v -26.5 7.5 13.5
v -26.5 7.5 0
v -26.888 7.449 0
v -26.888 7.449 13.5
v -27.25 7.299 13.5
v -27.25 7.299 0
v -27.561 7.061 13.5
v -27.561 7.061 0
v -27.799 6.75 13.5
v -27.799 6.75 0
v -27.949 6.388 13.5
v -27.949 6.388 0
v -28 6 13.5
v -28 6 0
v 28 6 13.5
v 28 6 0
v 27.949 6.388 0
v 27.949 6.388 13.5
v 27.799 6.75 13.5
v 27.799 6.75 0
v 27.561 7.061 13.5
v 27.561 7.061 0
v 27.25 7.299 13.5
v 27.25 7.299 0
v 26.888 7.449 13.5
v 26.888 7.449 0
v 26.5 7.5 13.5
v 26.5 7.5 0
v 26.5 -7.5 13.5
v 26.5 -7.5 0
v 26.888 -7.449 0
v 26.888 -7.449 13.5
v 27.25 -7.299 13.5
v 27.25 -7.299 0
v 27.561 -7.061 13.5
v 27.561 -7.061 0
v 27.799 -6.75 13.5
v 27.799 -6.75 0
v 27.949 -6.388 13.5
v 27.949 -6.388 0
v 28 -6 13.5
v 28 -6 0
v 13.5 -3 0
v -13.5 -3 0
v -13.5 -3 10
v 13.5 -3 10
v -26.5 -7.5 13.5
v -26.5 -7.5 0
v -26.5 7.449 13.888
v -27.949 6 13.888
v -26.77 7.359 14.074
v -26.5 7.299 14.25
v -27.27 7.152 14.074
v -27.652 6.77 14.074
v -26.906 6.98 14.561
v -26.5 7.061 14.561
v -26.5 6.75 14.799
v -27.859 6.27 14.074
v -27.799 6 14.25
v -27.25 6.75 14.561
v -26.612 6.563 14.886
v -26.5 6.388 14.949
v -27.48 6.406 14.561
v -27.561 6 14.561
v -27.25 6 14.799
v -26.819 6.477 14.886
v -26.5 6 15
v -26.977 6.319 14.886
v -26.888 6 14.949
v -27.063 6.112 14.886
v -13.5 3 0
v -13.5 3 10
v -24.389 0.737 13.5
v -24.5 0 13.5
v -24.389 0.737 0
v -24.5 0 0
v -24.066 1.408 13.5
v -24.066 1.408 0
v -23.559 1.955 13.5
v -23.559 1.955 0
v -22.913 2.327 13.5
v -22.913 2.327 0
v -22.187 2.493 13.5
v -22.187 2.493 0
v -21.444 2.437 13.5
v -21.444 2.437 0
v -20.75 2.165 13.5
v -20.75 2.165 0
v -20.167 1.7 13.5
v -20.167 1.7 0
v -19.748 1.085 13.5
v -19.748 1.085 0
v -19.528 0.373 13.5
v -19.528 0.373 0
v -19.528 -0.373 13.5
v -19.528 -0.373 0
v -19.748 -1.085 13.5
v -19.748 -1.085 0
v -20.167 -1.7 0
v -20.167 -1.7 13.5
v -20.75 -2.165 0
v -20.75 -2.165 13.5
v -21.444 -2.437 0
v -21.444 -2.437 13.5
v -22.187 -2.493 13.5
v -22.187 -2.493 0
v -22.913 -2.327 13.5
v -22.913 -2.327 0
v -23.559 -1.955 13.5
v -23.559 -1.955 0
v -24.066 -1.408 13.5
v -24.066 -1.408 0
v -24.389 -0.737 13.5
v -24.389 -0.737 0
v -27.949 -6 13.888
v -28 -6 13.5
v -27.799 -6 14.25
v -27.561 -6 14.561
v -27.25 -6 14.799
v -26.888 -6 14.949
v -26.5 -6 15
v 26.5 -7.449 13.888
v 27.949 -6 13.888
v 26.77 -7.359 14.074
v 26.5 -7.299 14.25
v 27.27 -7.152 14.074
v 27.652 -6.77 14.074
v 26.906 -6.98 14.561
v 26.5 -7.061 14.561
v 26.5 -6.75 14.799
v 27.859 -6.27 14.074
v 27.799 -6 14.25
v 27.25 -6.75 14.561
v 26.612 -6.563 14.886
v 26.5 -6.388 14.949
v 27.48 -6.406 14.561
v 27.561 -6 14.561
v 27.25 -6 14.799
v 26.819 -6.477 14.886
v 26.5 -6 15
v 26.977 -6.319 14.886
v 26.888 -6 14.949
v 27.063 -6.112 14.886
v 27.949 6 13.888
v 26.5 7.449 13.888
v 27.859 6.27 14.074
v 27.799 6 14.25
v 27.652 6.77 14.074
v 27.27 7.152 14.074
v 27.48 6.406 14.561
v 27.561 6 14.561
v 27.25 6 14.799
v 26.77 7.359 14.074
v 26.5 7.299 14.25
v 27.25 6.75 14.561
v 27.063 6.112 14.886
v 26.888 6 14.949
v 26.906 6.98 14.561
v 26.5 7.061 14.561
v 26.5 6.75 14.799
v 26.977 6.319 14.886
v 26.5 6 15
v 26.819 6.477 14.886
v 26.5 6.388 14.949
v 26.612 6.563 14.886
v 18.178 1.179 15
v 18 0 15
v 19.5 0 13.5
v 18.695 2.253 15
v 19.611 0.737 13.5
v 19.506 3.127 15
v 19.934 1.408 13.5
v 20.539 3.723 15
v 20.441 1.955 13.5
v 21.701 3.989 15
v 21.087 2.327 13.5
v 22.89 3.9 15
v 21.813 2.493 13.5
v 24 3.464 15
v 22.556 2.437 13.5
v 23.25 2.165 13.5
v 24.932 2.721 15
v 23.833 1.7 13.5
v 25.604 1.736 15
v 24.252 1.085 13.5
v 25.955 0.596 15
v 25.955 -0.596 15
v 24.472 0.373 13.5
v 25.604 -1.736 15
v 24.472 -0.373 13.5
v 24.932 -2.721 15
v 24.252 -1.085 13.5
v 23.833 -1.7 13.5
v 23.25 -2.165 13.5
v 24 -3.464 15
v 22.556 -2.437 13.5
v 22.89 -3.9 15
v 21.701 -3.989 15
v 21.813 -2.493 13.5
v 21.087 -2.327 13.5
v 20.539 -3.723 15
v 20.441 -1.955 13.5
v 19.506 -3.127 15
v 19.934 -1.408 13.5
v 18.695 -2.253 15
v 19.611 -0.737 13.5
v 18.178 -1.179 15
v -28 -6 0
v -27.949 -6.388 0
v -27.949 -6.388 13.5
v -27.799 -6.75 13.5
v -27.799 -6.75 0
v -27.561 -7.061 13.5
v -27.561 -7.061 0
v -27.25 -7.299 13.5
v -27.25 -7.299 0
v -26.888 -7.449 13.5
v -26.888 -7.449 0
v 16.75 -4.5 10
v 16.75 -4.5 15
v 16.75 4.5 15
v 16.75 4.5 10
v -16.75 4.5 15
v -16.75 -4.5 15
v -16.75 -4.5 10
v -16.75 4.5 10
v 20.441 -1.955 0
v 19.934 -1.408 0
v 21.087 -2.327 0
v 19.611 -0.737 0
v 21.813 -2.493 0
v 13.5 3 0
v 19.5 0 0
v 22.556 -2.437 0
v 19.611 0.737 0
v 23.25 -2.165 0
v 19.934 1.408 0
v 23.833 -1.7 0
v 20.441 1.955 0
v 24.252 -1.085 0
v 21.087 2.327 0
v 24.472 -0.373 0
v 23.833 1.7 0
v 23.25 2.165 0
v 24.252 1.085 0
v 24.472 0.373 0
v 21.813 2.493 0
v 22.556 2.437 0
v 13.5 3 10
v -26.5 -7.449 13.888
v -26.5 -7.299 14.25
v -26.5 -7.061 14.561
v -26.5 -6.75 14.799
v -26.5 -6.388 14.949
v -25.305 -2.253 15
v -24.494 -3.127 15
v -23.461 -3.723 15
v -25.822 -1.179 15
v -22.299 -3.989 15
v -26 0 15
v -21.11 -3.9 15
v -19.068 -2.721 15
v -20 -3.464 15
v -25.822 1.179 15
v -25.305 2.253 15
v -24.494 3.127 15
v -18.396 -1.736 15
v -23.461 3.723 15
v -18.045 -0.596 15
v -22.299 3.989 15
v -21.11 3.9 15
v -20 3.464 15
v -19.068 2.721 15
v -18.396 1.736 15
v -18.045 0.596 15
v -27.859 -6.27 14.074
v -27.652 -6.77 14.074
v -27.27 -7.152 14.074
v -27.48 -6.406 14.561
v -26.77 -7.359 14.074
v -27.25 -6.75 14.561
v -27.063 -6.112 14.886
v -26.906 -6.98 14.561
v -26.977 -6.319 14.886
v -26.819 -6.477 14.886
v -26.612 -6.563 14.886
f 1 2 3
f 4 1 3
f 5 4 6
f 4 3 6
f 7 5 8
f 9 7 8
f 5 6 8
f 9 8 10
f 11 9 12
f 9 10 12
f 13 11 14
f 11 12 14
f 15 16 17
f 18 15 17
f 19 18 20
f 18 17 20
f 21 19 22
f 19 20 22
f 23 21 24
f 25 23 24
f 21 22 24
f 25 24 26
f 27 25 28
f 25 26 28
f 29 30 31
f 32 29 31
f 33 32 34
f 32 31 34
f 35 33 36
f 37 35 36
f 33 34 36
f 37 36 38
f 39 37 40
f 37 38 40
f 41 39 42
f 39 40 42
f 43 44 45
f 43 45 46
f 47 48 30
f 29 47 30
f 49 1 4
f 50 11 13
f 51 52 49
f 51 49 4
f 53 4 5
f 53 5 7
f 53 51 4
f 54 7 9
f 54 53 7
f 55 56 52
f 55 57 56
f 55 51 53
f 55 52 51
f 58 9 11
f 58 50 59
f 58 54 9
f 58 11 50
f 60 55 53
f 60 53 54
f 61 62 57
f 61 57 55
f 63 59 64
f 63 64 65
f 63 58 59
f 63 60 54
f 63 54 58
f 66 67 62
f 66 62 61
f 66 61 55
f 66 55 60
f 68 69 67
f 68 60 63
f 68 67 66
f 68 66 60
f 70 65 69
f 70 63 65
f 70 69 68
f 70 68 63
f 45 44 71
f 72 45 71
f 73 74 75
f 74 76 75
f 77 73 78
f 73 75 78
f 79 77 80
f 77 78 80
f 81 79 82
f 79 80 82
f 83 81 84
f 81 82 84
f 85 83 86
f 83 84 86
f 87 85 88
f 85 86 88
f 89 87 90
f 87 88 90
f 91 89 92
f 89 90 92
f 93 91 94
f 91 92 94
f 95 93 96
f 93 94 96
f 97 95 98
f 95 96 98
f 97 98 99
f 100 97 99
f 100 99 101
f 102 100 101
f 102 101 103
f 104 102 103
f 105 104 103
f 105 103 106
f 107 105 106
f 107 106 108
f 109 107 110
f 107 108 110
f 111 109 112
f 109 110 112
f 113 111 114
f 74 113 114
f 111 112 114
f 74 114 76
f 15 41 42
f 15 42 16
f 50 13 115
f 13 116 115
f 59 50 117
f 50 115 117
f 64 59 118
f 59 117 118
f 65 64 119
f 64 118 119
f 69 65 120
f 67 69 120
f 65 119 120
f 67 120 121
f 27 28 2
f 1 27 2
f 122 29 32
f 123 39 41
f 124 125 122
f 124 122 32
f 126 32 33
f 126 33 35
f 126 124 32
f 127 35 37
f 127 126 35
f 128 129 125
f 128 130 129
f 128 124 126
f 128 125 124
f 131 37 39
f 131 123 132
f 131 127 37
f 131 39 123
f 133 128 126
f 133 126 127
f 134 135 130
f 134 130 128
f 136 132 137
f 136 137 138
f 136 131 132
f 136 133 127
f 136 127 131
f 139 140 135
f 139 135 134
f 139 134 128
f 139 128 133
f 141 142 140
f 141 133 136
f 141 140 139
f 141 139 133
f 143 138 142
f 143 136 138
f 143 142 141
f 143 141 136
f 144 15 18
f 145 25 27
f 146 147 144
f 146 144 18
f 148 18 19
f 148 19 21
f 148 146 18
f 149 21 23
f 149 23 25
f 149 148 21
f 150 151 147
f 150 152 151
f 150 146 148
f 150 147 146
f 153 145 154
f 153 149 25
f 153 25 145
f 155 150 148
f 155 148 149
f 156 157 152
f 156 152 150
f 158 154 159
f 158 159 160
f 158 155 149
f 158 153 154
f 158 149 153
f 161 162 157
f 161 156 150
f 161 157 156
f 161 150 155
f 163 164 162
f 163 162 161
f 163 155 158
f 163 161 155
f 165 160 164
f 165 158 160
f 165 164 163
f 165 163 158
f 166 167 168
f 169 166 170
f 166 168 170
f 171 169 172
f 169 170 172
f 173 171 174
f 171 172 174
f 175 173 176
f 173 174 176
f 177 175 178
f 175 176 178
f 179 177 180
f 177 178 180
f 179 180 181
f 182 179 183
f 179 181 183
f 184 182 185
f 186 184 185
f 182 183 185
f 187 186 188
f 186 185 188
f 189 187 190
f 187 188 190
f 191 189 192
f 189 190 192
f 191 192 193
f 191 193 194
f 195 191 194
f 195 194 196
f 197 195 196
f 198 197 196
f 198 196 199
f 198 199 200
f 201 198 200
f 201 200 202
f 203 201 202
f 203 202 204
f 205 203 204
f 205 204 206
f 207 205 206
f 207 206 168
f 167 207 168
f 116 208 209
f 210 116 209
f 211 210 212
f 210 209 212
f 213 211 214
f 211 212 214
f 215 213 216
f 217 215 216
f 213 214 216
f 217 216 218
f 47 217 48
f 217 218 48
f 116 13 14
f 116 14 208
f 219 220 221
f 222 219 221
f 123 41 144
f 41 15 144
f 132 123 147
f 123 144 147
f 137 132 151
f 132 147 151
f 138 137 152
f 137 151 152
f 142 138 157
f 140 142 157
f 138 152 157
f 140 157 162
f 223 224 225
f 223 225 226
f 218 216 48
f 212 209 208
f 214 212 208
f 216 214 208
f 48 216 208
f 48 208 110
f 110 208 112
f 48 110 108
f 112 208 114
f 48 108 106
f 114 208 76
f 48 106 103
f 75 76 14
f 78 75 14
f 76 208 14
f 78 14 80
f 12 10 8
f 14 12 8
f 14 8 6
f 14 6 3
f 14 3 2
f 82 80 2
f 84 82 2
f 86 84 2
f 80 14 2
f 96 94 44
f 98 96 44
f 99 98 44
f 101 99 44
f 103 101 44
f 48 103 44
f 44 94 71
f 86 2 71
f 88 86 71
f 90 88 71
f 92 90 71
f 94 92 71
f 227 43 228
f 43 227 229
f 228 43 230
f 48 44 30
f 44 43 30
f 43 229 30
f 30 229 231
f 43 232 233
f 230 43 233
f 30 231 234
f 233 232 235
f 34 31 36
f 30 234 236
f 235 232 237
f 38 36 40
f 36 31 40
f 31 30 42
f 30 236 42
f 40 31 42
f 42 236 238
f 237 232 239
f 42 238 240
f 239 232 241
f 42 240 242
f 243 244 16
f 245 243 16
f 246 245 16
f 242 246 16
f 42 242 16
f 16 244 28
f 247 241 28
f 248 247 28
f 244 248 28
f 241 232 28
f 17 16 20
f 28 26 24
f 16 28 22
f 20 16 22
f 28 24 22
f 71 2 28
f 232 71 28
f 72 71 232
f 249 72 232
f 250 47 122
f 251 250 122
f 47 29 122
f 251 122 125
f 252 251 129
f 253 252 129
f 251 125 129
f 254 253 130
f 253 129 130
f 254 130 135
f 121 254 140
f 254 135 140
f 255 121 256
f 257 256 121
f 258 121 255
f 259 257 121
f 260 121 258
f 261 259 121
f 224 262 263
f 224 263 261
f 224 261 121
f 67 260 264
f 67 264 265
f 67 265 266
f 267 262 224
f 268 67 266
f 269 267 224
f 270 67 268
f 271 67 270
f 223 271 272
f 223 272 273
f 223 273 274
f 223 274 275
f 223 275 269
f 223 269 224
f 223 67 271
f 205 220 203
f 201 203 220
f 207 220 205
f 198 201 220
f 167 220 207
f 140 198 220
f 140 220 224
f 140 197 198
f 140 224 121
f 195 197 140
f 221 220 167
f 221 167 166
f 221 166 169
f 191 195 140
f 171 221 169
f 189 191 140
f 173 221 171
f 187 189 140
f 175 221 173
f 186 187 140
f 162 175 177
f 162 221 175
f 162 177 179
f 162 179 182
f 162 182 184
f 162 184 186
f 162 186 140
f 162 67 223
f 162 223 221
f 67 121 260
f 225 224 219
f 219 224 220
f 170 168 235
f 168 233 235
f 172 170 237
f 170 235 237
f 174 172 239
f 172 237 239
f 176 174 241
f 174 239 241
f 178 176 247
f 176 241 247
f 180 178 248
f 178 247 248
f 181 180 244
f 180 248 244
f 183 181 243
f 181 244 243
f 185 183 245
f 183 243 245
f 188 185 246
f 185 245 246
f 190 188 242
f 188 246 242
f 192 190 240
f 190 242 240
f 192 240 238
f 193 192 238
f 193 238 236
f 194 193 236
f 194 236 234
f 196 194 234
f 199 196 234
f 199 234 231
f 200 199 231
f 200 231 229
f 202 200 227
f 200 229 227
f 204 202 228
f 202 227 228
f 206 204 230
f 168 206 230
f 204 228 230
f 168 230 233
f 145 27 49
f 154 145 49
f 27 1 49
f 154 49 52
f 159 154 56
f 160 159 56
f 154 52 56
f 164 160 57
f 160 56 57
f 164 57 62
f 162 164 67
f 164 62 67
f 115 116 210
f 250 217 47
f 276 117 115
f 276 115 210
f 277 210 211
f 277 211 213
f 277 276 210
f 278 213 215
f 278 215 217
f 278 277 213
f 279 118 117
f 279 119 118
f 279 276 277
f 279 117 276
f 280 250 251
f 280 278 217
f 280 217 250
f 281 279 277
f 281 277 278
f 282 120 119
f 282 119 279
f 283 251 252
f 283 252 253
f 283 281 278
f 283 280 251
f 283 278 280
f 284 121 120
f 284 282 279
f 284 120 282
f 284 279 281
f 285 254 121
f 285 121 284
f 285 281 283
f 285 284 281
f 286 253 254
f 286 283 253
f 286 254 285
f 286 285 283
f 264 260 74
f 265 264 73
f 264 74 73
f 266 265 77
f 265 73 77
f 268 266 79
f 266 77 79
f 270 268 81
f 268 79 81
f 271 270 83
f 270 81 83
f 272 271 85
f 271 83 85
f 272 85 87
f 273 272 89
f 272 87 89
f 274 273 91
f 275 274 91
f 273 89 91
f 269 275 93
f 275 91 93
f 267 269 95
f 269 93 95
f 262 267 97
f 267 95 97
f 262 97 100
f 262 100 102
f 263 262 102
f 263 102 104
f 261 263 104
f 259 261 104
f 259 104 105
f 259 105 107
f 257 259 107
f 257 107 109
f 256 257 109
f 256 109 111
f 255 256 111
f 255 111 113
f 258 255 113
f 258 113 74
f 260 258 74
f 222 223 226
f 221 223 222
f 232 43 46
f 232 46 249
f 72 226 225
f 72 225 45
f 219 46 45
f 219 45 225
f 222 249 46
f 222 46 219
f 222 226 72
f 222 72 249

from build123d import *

# Parameters (mm, degrees)
F0_W           = 27
F0_H           = 6
F1_DEPTH       = 15
F3_R           = 1.5
F2_W           = 33.5
F2_H           = 9
F2_W_2         = 27
F2_H_2         = 6
F4_DEPTH       = 5
F5_D           = 5
F5_CSINK_D     = 8
F5_CSINK_ANGLE = 90


with BuildPart() as f1:
    # F0 (on Top) → F1 (new body)
    with BuildSketch(Plane.XY):
        with BuildLine():
            Line((-26.5, -7.5), (26.5, -7.5))
            ThreePointArc((26.5, -7.5), (27.5606601718, -7.0606601718), (28, -6))
            Line((28, -6), (28, 6))
            ThreePointArc((28, 6), (27.5606601718, 7.0606601718), (26.5, 7.5))
            Line((26.5, 7.5), (-26.5, 7.5))
            ThreePointArc((-26.5, 7.5), (-27.5606601718, 7.0606601718), (-28, 6))
            Line((-28, 6), (-28, -6))
            ThreePointArc((-28, -6), (-27.5606601718, -7.0606601718), (-26.5, -7.5))
        make_face()
        Rectangle(F0_W, F0_H, mode=Mode.SUBTRACT)
    extrude(amount=F1_DEPTH)

    # F3
    f3_edges = [f1.edges().sort_by_distance(p)[0] for p in [
        (0, -7.5, 15),
        (27.56066, -7.06066, 15),
        (28, 0, 15),
        (27.56066, 7.06066, 15),
        (0, 7.5, 15),
        (-27.56066, 7.06066, 15),
        (-28, 0, 15),
        (-27.56066, -7.06066, 15),
        (13.5, 0, 15),
        (0, -3, 15),
        (-13.5, 0, 15),
        (0, 3, 15),
    ]]
    fillet(f3_edges, radius=F3_R)

    # F2 (on face) → F4 (cut)
    with BuildSketch(Plane.XY.offset(15)):
        Rectangle(F2_W, F2_H)
        Rectangle(F2_W_2, F2_H_2, mode=Mode.SUBTRACT)
    extrude(amount=-F4_DEPTH, mode=Mode.SUBTRACT)

    # F5 (through all)
    with Locations(Plane.XY.offset(15)):
        with Locations((-22, 0), (22, 0)):
            CounterSinkHole(F5_D / 2, F5_CSINK_D / 2, counter_sink_angle=F5_CSINK_ANGLE)


solid = f1.part
